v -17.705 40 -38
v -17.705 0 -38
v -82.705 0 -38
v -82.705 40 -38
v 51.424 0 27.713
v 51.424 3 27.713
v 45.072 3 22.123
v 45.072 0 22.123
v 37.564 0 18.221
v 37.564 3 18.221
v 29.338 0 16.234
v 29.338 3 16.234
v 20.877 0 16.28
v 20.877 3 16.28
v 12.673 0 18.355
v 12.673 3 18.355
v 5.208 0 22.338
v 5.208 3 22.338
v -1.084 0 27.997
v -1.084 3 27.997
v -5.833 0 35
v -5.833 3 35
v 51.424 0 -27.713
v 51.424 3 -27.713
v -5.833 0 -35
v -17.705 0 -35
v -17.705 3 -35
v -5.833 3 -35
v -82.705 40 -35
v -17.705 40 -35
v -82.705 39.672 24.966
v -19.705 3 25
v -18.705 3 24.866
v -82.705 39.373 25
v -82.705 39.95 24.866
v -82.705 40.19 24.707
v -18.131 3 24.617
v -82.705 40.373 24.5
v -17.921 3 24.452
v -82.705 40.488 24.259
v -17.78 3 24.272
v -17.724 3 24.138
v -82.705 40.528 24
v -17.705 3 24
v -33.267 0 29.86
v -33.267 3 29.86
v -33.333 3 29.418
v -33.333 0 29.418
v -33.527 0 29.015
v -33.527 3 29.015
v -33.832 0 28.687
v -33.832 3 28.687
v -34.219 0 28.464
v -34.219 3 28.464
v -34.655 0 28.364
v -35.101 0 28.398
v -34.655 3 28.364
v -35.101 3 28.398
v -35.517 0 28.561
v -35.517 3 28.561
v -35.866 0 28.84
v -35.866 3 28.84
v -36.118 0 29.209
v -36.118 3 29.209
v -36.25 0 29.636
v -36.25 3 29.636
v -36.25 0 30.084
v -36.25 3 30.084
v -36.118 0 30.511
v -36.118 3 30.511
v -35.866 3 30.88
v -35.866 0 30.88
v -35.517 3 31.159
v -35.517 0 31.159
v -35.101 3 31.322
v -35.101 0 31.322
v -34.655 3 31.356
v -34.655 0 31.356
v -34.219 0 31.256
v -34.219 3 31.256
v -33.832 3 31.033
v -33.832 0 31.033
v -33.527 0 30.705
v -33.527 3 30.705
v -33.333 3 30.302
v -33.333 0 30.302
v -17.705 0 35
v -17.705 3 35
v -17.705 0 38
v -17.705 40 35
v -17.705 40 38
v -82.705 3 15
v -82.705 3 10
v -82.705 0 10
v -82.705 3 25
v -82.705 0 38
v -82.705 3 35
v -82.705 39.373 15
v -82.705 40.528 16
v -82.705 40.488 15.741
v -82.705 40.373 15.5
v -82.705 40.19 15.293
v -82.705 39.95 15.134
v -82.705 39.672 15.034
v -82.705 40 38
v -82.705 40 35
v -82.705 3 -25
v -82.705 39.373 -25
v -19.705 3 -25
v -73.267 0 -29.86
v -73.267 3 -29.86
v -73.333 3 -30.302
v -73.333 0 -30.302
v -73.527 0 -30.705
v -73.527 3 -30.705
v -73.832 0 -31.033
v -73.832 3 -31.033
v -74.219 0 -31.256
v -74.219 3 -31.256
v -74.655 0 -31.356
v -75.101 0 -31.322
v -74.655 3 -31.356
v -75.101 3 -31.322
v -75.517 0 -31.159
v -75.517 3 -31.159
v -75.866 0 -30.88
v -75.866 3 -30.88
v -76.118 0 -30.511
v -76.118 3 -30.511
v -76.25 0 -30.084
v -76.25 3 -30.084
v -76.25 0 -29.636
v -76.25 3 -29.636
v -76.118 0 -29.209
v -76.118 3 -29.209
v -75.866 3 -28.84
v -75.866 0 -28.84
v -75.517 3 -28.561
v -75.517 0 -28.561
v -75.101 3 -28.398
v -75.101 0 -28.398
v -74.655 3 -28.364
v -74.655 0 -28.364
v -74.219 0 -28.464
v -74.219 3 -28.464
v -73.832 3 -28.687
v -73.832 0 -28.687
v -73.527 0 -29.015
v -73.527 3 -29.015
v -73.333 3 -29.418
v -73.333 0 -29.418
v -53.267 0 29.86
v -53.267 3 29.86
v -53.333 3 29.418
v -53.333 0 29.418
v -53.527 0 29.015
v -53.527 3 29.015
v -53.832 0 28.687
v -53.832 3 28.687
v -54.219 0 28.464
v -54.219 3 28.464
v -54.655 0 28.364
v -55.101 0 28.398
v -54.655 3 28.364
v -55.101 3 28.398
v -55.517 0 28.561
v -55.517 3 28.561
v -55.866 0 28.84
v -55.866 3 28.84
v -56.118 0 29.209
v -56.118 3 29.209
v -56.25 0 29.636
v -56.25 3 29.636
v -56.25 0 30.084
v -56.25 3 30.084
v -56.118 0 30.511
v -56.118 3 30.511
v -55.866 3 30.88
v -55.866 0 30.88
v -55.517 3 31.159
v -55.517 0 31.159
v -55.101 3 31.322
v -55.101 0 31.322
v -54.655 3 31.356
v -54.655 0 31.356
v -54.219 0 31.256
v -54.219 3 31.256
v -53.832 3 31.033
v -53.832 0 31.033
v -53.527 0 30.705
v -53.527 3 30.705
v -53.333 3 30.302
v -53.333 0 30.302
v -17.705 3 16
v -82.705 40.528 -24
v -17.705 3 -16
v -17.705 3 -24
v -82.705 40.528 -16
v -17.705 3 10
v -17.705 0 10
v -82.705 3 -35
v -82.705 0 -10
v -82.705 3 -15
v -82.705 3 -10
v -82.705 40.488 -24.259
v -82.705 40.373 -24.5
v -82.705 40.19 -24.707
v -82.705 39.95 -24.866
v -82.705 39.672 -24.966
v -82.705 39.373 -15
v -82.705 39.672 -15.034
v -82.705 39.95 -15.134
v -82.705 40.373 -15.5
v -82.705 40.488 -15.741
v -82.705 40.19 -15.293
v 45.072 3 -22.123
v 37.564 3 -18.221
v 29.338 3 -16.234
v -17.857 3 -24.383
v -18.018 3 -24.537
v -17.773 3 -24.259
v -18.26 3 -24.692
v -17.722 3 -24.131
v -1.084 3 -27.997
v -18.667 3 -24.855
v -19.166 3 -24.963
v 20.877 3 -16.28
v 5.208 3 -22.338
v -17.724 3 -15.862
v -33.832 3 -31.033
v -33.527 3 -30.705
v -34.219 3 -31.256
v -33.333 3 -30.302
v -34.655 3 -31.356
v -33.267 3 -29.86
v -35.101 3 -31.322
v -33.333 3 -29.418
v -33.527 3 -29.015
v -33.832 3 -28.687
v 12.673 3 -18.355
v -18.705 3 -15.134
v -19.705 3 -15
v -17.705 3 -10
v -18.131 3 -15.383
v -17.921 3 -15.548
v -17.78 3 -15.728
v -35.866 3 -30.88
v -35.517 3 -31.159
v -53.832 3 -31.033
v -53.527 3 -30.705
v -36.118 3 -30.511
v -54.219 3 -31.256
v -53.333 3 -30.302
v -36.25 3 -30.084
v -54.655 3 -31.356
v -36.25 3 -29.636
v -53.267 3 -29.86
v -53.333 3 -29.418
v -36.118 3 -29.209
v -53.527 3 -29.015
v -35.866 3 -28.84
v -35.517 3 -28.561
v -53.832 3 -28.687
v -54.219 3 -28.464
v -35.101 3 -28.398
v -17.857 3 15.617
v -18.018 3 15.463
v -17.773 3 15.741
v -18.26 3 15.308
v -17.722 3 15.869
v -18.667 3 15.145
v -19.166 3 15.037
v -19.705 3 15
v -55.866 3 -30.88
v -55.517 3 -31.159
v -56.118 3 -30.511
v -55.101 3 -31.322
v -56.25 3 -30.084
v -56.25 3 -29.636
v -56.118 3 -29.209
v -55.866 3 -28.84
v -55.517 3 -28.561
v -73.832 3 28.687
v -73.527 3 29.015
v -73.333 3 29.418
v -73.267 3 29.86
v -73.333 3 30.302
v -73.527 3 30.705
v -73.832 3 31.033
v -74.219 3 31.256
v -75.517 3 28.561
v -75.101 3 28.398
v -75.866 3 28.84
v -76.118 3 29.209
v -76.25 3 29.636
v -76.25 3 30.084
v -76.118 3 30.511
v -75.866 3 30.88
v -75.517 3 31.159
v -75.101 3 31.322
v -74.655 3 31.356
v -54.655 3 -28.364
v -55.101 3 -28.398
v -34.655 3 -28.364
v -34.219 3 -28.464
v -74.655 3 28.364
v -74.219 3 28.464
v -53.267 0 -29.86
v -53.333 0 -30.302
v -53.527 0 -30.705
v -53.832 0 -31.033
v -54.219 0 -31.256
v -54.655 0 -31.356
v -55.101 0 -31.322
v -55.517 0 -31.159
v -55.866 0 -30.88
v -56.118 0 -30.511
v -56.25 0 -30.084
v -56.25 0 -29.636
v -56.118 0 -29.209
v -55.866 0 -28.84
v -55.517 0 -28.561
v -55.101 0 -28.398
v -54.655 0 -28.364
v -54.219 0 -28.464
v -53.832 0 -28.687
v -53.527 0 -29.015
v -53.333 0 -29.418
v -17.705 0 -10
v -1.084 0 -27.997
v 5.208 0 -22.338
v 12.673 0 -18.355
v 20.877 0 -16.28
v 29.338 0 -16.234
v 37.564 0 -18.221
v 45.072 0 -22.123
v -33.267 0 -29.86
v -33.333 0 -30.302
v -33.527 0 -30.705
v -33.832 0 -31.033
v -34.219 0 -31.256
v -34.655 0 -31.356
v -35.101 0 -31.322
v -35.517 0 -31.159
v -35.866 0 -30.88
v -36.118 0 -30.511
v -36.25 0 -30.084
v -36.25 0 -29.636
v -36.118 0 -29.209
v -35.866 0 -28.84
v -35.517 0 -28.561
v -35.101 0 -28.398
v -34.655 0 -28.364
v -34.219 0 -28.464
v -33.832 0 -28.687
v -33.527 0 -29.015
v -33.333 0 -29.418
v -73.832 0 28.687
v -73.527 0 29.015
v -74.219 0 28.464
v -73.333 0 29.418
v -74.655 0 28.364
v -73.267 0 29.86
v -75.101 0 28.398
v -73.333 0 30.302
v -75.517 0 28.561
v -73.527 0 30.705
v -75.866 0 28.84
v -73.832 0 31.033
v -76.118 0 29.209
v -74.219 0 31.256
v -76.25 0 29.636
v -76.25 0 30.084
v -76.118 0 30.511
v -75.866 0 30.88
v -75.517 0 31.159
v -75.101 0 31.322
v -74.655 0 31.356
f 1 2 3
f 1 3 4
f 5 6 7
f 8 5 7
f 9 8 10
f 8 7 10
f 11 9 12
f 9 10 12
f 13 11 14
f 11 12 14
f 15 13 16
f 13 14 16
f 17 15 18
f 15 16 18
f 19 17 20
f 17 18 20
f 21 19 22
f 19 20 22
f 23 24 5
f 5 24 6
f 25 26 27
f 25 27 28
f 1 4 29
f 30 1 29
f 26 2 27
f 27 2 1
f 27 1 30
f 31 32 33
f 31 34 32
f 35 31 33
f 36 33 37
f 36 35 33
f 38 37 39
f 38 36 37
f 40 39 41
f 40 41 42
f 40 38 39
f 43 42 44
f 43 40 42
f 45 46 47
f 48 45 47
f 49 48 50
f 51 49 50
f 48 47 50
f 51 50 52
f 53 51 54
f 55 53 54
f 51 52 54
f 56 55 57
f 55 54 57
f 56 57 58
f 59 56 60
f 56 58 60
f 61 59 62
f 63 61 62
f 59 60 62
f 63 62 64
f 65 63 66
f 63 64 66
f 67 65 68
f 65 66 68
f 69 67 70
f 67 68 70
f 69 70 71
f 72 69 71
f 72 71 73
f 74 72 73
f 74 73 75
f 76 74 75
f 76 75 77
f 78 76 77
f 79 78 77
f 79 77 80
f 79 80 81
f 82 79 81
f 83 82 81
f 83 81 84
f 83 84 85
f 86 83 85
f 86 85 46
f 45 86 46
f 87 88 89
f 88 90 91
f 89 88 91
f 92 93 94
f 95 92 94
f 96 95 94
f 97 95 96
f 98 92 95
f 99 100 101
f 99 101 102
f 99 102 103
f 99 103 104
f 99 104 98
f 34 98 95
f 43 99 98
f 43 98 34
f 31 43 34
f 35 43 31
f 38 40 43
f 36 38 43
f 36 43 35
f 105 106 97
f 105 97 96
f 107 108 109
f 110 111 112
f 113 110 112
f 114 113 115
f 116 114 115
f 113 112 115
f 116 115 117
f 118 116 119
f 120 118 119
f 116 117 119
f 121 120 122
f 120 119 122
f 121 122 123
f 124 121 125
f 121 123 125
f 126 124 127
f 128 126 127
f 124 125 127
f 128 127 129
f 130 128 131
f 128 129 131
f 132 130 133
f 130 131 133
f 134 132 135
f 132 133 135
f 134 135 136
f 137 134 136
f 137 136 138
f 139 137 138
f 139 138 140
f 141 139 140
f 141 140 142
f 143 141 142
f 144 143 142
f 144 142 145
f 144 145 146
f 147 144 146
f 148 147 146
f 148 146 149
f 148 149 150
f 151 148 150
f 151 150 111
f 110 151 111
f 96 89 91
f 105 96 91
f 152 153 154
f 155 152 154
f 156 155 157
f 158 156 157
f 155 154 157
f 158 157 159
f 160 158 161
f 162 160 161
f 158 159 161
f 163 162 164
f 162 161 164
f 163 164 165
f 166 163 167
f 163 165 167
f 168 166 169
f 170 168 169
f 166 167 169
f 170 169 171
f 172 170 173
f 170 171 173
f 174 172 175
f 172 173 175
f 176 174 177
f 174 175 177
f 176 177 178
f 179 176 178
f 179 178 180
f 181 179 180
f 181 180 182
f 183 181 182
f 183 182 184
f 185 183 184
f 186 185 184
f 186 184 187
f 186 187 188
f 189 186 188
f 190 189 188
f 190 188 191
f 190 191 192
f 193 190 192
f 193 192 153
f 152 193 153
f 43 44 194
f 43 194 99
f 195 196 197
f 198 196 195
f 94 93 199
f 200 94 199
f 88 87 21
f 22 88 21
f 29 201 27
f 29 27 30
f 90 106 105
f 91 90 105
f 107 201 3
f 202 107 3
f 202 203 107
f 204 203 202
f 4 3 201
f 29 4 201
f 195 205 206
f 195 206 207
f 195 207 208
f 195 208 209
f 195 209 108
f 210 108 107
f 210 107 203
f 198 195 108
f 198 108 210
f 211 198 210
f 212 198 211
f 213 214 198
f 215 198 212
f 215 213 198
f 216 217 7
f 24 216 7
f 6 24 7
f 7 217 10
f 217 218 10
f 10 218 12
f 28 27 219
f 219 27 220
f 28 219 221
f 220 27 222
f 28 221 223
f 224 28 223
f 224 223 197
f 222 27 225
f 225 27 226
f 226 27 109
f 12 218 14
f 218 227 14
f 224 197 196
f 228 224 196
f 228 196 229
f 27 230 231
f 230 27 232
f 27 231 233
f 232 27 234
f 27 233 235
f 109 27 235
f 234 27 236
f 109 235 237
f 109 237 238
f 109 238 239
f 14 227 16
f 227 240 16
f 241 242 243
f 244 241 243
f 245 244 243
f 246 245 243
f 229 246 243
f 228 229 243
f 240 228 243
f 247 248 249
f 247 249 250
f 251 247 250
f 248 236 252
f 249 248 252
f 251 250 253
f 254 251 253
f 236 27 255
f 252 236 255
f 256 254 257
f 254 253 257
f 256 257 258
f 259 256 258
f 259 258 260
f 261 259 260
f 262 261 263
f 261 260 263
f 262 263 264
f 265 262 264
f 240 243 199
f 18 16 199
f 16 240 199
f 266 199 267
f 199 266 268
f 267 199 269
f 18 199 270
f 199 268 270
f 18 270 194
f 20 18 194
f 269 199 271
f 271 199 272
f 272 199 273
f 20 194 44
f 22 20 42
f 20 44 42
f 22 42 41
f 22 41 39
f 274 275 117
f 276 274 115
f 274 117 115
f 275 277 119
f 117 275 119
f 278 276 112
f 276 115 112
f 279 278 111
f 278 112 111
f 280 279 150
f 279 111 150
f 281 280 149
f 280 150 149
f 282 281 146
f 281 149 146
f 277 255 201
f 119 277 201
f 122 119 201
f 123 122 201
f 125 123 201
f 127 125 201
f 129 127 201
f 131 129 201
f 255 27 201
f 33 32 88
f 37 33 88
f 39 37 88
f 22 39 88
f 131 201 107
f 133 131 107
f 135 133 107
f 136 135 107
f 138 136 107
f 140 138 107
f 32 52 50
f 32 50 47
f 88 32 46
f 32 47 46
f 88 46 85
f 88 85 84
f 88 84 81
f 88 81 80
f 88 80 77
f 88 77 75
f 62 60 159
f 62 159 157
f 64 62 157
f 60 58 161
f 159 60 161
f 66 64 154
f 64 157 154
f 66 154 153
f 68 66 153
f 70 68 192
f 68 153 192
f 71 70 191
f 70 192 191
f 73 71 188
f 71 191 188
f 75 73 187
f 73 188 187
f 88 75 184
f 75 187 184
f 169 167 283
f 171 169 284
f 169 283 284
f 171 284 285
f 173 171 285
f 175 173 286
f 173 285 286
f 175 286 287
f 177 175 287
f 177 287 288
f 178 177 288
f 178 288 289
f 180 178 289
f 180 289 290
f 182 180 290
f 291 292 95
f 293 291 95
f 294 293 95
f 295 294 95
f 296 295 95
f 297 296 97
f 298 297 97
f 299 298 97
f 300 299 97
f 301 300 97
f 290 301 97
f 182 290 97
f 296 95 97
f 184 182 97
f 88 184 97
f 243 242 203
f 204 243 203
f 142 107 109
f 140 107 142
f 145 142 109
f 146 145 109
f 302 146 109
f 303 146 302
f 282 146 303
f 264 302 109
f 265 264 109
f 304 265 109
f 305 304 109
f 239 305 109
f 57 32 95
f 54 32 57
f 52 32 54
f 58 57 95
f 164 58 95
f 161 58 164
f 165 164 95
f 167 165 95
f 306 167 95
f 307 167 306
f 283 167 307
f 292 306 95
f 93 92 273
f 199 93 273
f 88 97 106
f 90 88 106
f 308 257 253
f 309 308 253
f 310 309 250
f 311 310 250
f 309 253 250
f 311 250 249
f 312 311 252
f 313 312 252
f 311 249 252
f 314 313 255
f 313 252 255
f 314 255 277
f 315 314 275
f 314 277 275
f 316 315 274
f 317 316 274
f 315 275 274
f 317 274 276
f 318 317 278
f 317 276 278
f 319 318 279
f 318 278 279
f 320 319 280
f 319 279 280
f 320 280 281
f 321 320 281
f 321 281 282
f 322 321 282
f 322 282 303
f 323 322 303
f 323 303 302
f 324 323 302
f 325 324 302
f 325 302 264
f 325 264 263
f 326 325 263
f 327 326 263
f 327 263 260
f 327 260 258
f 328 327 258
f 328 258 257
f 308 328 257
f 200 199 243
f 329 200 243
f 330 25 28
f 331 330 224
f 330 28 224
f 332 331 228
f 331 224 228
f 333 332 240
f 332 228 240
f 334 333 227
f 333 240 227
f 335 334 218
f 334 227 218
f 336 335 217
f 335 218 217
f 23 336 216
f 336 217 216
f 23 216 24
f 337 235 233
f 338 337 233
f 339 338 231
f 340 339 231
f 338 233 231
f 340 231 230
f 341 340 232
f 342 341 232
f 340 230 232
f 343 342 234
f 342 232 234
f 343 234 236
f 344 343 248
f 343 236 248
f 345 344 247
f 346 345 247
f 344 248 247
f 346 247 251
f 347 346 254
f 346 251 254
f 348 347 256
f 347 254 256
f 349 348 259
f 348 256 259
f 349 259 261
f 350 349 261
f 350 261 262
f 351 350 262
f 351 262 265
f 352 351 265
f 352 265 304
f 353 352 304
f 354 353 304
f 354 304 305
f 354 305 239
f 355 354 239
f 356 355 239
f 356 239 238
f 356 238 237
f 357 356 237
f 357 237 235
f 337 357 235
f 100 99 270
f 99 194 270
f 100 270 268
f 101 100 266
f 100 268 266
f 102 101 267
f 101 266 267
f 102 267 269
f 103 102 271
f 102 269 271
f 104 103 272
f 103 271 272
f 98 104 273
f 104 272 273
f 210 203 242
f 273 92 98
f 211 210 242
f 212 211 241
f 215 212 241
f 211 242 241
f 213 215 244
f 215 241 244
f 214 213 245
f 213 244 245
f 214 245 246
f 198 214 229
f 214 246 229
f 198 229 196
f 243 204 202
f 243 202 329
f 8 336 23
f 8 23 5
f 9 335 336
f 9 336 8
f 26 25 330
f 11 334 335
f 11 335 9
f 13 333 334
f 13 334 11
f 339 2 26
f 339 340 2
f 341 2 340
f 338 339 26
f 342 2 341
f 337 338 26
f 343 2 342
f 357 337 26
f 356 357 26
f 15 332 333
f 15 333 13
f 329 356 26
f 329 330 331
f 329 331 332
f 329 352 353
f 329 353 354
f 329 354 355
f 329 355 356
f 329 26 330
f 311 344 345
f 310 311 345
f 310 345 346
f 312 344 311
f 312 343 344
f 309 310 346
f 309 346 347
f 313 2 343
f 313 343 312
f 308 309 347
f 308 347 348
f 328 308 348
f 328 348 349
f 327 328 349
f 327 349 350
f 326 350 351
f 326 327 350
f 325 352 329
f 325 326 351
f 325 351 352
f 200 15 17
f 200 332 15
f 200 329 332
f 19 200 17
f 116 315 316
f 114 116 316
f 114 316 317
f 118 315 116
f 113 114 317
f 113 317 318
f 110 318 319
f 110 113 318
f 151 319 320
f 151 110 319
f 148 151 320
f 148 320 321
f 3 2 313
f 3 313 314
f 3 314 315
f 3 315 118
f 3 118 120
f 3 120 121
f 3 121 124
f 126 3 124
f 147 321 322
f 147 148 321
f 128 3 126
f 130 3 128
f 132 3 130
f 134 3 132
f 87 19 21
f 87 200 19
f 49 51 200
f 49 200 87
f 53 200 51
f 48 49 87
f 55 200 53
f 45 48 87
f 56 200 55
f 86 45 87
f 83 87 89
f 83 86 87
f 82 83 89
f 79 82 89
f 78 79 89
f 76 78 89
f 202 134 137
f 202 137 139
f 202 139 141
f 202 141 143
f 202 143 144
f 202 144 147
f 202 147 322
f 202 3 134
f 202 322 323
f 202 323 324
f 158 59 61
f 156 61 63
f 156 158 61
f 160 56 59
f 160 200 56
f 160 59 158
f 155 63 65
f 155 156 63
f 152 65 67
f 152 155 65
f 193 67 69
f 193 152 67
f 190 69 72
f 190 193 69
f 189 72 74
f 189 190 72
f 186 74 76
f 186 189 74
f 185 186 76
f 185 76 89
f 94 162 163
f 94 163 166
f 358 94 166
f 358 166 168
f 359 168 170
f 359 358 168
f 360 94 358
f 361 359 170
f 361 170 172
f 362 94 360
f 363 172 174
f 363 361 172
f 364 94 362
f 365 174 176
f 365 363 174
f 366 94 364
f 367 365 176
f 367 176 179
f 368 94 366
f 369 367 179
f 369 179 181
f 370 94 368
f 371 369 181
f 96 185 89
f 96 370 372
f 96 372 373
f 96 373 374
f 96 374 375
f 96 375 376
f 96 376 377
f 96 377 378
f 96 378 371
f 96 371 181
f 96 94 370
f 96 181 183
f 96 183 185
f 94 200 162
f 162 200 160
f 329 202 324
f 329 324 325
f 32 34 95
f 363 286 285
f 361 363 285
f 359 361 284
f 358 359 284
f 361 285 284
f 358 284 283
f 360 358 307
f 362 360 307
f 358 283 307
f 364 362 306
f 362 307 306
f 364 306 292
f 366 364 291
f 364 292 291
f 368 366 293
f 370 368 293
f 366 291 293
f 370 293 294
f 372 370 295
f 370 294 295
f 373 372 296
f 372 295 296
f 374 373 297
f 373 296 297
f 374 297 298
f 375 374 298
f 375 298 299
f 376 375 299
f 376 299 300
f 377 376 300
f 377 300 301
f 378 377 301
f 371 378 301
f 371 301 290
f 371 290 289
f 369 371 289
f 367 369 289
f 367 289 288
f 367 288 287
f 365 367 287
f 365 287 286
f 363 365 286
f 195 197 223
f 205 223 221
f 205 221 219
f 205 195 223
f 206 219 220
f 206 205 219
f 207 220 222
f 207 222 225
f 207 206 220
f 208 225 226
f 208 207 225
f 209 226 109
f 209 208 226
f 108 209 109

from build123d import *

# Parameters (mm, degrees)
SKETCH_1_W           = 220
SKETCH_1_H           = 70
EXTRUDE_1_DEPTH      = 3
EXTRUDE_2_DEPTH      = 25
EXTRUDE_2_DEPTH_BACK = 25
SKETCH_6_W           = 30
SKETCH_6_H           = 37.527767497
CUT_EXTRUDE_4_DEPTH  = 221
SKETCH_7_R           = 35
CUT_EXTRUDE_5_DEPTH  = 4
SKETCH_8_W           = 3
SKETCH_8_H           = 40
EXTRUDE_3_DEPTH      = 65
SKETCH_9_R           = 1.5
CUT_EXTRUDE_6_DEPTH  = 4
FILLET_5_R           = 1
SKETCH_10_W          = 65
SKETCH_10_H          = 20
CUT_EXTRUDE_7_DEPTH  = 4
SKETCH_12_R          = 1.5
CUT_EXTRUDE_8_DEPTH  = 4


with BuildPart() as part:
    # 草图1 → 凸台-拉伸1 (new body)
    with BuildSketch(Plane(origin=(0, 0, 0), x_dir=(1, 0, 0), z_dir=(0, 1, 0))):
        with Locations((27.295373665, 0)):
            Rectangle(SKETCH_1_W, SKETCH_1_H)
    extrude(amount=EXTRUDE_1_DEPTH)

    # 草图2 → 凸台-拉伸2 (add, two sides)
    with BuildSketch(Plane.XY) as extrude_2_sk:
        Polygon((-82.704626335, 40.527767497), (-82.704626335, 3), (-17.704626335, 3), align=None)
    extrude(amount=EXTRUDE_2_DEPTH)
    extrude(extrude_2_sk.sketch, amount=-EXTRUDE_2_DEPTH_BACK)

    # 草图6 → 切除-拉伸4 (cut, through all)
    with BuildSketch(Plane.ZY.offset(82.704626335)):
        with Locations((0, 21.763883748)):
            Rectangle(SKETCH_6_W, SKETCH_6_H)
    extrude(amount=-CUT_EXTRUDE_4_DEPTH, mode=Mode.SUBTRACT)

    # 草图7 → 切除-拉伸5 (cut, through all)
    with BuildSketch(Plane(origin=(0, 3, 0), x_dir=(1, 0, 0), z_dir=(0, 1, 0))):
        with Locations((25.295373665, 51)):
            Circle(SKETCH_7_R)
        with Locations((25.295373665, -51)):
            Circle(SKETCH_7_R)
    extrude(amount=-CUT_EXTRUDE_5_DEPTH, mode=Mode.SUBTRACT)

    # 草图8 → 凸台-拉伸3 (add)
    with BuildSketch(Plane.ZY.offset(82.704626335)):
        with Locations((36.5, 20)):
            Rectangle(SKETCH_8_W, SKETCH_8_H)
        with Locations((-36.5, 20)):
            Rectangle(SKETCH_8_W, SKETCH_8_H)
    extrude(amount=-EXTRUDE_3_DEPTH)

    # 草图9 → 切除-拉伸6 (cut, through all)
    with BuildSketch(Plane(origin=(0, 3, 0), x_dir=(1, 0, 0), z_dir=(0, 1, 0))):
        with Locations((-74.766784803, 29.860059225)):
            Circle(SKETCH_9_R)
        with Locations((-54.766784803, 29.860059225)):
            Circle(SKETCH_9_R)
        with Locations((-34.766784803, 29.860059225)):
            Circle(SKETCH_9_R)
        with Locations((-34.766784803, -29.860059225)):
            Circle(SKETCH_9_R)
        with Locations((-54.766784803, -29.860059225)):
            Circle(SKETCH_9_R)
        with Locations((-74.766784803, -29.860059225)):
            Circle(SKETCH_9_R)
        with Locations((68.031562246, 22)):
            Circle(SKETCH_9_R)
        with Locations((88.031562246, 22)):
            Circle(SKETCH_9_R)
        with Locations((108.031562246, 22)):
            Circle(SKETCH_9_R)
        with Locations((108.031562246, -22)):
            Circle(SKETCH_9_R)
        with Locations((88.031562246, -22)):
            Circle(SKETCH_9_R)
        with Locations((68.031562246, -22)):
            Circle(SKETCH_9_R)
        with Locations((128.031562246, 22)):
            Circle(SKETCH_9_R)
        with Locations((128.031562246, -22)):
            Circle(SKETCH_9_R)
    extrude(amount=-CUT_EXTRUDE_6_DEPTH, mode=Mode.SUBTRACT)

    # 圆角5
    fillet_5_edges = [part.edges().sort_by_distance(p)[0] for p in [
        (-50.204626335, 21.763883749, -25),
        (-50.204626335, 21.763883749, 25),
        (-50.204626335, 21.763883749, -15),
        (-50.204626335, 21.763883749, 15),
    ]]
    fillet(fillet_5_edges, radius=FILLET_5_R)

    # 草图10 → 切除-拉伸7 (cut, through all)
    with BuildSketch(Plane(origin=(0, 3, 0), x_dir=(1, 0, 0), z_dir=(0, 1, 0))):
        with Locations((-50.204626335, 0)):
            Rectangle(SKETCH_10_W, SKETCH_10_H)
    extrude(amount=-CUT_EXTRUDE_7_DEPTH, mode=Mode.SUBTRACT)

    # 草图12 → 切除-拉伸8 (cut, through all)
    with BuildSketch(Plane(origin=(0, 3, 0), x_dir=(1, 0, 0), z_dir=(0, 1, 0))):
        with BuildLine():
            Line((51.424138498, 27.712929589), (51.424138498, 0))
            Line((51.424138498, 0), (51.424138498, -27.712929589))
            ThreePointArc((51.424138498, -27.712929589), (54.155060508, -31.198018398), (56.424138498, -35))
            Line((56.424138498, -35), (137.295373665, -35))
            Line((137.295373665, -35), (137.295373665, 35))
            Line((137.295373665, 35), (56.424138498, 35))
            ThreePointArc((56.424138498, 35), (54.155060508, 31.198018398), (51.424138498, 27.712929589))
        make_face()
        with Locations((68.031562246, -22)):
            Circle(SKETCH_12_R, mode=Mode.SUBTRACT)
        with Locations((88.031562246, -22)):
            Circle(SKETCH_12_R, mode=Mode.SUBTRACT)
        with Locations((108.031562246, -22)):
            Circle(SKETCH_12_R, mode=Mode.SUBTRACT)
        with Locations((128.031562246, -22)):
            Circle(SKETCH_12_R, mode=Mode.SUBTRACT)
        with Locations((68.031562246, 22)):
            Circle(SKETCH_12_R, mode=Mode.SUBTRACT)
        with Locations((88.031562246, 22)):
            Circle(SKETCH_12_R, mode=Mode.SUBTRACT)
        with Locations((108.031562246, 22)):
            Circle(SKETCH_12_R, mode=Mode.SUBTRACT)
        with Locations((128.031562246, 22)):
            Circle(SKETCH_12_R, mode=Mode.SUBTRACT)
    extrude(amount=-CUT_EXTRUDE_8_DEPTH, mode=Mode.SUBTRACT)


solid = part.part
